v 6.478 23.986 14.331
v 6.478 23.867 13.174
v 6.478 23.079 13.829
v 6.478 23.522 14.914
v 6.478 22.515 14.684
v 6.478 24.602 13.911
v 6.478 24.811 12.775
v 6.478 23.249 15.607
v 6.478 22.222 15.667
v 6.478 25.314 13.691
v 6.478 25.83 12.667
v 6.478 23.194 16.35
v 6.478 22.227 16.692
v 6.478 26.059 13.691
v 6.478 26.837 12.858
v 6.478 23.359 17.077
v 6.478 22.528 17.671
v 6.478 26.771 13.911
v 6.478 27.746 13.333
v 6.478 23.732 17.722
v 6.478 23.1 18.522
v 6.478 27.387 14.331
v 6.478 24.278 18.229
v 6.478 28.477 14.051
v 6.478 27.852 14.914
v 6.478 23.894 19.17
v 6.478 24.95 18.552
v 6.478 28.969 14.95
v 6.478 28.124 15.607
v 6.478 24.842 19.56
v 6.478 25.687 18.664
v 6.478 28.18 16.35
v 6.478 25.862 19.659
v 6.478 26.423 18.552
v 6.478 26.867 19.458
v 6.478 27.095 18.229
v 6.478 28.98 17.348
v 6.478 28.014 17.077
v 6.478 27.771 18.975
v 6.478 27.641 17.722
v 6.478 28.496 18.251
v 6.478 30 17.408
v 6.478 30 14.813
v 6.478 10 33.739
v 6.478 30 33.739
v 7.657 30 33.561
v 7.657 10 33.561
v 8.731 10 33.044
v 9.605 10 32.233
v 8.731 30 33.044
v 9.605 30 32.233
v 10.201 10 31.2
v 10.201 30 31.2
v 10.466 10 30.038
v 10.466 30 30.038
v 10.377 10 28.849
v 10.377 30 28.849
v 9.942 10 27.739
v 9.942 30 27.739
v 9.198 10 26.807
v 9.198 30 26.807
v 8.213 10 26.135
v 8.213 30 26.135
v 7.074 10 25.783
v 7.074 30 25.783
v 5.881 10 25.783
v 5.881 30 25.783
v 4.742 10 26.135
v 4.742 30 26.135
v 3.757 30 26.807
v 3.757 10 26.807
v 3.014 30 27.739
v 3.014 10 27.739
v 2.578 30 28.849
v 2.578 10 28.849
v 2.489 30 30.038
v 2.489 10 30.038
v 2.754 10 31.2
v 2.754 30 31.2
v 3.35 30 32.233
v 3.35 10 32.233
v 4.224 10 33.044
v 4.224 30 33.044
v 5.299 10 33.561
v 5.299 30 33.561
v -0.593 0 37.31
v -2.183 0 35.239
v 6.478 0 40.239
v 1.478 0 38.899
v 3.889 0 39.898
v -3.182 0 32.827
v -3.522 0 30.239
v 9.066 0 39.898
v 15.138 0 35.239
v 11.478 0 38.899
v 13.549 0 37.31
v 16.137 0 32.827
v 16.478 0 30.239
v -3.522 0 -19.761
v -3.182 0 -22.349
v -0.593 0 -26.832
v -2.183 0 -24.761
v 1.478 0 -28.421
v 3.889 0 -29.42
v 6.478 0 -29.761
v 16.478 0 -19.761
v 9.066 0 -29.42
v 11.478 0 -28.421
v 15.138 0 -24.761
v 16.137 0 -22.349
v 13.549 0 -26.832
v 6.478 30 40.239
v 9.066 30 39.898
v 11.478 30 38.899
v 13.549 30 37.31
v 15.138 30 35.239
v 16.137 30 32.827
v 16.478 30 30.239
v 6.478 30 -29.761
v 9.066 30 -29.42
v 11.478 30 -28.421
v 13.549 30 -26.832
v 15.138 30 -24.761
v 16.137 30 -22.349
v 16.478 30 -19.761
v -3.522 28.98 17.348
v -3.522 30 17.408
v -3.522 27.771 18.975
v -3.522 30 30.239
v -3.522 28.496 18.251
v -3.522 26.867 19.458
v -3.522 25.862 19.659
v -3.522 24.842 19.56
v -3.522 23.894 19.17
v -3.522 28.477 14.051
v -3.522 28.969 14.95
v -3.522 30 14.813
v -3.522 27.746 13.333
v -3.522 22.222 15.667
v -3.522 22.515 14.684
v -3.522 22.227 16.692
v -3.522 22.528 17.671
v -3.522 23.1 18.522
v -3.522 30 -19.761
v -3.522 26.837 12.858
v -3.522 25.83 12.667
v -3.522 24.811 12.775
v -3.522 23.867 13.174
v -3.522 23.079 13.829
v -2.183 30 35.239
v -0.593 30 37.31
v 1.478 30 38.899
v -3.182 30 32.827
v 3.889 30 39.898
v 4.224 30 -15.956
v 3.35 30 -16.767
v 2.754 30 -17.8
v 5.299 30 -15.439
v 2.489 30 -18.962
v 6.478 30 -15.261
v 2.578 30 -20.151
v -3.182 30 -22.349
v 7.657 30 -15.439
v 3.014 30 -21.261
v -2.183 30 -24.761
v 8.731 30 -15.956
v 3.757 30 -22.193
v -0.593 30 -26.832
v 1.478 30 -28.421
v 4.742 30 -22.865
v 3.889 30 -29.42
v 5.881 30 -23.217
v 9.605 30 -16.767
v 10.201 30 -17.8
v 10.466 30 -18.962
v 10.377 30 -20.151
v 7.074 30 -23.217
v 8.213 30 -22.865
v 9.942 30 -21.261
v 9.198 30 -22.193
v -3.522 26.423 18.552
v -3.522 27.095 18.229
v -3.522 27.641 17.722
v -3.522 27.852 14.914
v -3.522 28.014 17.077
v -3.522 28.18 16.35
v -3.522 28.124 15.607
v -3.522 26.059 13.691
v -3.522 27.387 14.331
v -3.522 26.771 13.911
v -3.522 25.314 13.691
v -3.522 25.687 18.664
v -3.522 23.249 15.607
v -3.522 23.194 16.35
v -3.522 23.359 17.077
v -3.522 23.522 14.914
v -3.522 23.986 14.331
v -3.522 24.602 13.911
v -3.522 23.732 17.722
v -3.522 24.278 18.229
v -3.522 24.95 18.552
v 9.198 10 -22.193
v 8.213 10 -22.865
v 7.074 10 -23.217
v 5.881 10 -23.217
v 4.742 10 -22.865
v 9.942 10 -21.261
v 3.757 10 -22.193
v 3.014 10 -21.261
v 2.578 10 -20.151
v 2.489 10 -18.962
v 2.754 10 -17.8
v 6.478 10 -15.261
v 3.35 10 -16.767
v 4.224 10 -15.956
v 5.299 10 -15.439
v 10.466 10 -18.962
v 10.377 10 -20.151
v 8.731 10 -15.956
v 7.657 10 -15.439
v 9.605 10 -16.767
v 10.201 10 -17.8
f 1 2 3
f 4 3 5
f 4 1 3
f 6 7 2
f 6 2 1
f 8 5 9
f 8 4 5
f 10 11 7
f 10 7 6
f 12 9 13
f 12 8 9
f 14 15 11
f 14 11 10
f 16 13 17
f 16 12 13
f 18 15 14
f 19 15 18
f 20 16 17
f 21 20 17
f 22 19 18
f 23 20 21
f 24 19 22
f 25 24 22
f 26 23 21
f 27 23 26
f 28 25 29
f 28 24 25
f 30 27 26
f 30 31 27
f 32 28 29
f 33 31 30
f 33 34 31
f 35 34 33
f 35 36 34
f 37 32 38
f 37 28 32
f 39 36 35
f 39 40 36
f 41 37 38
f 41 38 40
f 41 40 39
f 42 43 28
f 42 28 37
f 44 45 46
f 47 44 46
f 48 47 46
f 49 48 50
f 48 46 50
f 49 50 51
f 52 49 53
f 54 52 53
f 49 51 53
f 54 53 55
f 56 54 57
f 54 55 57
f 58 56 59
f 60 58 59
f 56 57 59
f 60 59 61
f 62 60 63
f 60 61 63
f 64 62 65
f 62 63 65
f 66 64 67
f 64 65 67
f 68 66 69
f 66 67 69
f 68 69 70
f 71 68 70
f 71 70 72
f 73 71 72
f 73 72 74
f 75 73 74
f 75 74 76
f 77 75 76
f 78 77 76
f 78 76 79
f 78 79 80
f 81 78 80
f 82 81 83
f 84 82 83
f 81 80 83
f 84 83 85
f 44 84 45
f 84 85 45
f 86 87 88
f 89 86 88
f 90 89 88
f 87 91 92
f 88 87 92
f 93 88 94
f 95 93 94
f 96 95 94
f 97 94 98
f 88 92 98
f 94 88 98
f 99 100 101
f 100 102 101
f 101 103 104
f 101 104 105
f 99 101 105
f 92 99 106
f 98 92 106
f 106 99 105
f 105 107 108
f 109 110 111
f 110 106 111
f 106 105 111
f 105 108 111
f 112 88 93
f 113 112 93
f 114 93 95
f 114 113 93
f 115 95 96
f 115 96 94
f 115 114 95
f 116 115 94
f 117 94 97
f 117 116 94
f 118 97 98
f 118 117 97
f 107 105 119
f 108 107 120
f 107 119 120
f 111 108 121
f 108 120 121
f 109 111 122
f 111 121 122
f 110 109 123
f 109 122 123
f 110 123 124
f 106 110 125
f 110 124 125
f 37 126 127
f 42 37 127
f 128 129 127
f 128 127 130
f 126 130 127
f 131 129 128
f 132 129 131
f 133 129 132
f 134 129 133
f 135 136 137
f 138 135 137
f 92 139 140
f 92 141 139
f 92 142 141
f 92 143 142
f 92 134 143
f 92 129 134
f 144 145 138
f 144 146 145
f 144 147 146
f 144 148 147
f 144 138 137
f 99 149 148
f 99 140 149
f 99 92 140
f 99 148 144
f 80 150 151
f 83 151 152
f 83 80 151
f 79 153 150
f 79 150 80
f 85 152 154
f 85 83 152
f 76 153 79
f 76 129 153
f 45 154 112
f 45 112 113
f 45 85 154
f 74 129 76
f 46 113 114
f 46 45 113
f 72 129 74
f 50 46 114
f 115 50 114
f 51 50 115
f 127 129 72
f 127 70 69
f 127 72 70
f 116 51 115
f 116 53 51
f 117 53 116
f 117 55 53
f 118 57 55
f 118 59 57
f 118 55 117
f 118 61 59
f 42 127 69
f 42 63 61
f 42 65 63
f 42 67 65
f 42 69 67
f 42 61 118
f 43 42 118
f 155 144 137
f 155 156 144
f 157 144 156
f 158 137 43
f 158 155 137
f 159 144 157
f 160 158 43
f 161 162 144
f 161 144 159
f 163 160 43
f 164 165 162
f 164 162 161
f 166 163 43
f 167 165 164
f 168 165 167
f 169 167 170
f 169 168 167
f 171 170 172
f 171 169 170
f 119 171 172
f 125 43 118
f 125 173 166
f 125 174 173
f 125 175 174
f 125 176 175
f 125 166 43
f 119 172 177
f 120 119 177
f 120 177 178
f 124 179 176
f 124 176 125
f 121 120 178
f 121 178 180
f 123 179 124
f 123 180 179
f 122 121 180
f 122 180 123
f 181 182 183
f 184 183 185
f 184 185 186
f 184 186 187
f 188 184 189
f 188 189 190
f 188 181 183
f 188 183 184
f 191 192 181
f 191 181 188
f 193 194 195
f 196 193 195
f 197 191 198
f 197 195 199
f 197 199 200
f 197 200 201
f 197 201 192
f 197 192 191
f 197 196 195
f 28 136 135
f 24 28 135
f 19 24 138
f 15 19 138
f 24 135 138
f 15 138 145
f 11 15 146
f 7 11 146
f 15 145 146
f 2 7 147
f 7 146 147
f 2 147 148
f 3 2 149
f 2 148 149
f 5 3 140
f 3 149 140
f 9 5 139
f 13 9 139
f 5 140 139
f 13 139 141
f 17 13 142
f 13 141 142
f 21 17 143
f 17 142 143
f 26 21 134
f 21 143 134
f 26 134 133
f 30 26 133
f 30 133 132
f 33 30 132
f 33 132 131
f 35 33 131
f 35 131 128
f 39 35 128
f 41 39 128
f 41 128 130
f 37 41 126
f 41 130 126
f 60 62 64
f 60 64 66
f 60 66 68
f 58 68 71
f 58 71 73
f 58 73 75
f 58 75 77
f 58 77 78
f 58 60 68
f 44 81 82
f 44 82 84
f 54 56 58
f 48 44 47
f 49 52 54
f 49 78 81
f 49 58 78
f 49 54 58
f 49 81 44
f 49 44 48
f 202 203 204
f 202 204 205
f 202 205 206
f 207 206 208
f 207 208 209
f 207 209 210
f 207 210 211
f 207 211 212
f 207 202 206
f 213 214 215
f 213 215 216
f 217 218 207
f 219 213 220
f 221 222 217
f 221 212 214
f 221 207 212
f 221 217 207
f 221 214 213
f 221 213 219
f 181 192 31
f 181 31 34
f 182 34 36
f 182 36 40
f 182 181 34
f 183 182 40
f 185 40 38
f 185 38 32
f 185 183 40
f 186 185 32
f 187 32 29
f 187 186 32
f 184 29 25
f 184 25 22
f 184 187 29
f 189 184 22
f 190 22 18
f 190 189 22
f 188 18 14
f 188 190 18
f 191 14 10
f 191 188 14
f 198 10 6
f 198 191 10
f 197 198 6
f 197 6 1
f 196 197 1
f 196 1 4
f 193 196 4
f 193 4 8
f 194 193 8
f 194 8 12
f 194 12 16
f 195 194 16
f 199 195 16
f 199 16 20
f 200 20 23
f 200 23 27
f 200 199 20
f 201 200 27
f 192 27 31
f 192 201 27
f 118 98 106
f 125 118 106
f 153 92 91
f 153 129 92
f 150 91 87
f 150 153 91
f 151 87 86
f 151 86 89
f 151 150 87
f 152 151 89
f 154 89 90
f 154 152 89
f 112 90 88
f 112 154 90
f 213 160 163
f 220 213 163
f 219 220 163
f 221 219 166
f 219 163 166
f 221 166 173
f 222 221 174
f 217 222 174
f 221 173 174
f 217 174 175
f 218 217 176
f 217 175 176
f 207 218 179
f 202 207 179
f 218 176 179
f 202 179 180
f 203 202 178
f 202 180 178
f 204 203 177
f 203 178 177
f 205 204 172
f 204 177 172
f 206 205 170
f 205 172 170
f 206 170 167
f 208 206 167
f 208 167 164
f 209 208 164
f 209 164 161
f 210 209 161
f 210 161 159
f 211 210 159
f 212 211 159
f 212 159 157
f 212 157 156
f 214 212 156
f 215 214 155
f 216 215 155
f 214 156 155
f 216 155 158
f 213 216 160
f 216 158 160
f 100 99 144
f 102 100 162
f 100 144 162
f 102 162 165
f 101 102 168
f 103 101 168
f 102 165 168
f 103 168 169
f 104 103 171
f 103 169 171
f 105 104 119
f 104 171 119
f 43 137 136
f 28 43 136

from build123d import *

# Parameters (mm, degrees)
SKETCH2_W           = 20
SKETCH2_H           = 70
BOSS_EXTRUDE1_DEPTH = 30
SKETCH3_R           = 4
CUT_EXTRUDE1_DEPTH  = 20
SKETCH4_R           = 2.5
CUT_EXTRUDE2_DEPTH  = 10
FILLET1_R           = 10


with BuildPart() as part:
    # Sketch2 → Boss-Extrude1 (new body)
    with BuildSketch(Plane(origin=(0, 0, 0), x_dir=(1, 0, 0), z_dir=(0, 1, 0))):
        with Locations((6.47761194, -5.23880597)):
            Rectangle(SKETCH2_W, SKETCH2_H)
    extrude(amount=BOSS_EXTRUDE1_DEPTH)

    # Sketch3 → Cut-Extrude1 (cut)
    with BuildSketch(Plane(origin=(0, 30, 0), x_dir=(1, 0, 0), z_dir=(0, 1, 0))):
        with Locations(Location((6.47761194, 19.26119403, 0), (0, 0, 270))):
            Circle(SKETCH3_R)
        with Locations(Location((6.47761194, -29.73880597, 0), (0, 0, 270))):
            Circle(SKETCH3_R)
    extrude(amount=-CUT_EXTRUDE1_DEPTH, mode=Mode.SUBTRACT)

    # Sketch4 → Cut-Extrude2 (cut)
    with BuildSketch(Plane.ZY.offset(3.52238806)):
        with BuildLine():
            Line((17.415034126, 30.126407987), (14.795699792, 30.126407987))
            Line((14.795699792, 30.126407987), (14.949961333, 28.969446425))
            ThreePointArc((14.949961333, 28.969446425), (16.17927412, 22.186618473), (17.347611009, 28.980215007))
            Line((17.347611009, 28.980215007), (17.415034126, 30.126407987))
        make_face()
        with Locations((16.163554702, 25.686583173)):
            Circle(SKETCH4_R, mode=Mode.SUBTRACT)
    extrude(amount=-CUT_EXTRUDE2_DEPTH, mode=Mode.SUBTRACT)

    # Fillet1
    fillet1_edges = [part.edges().sort_by_distance(p)[0] for p in [
        (-3.52238806, 15, -29.76119403),
        (16.47761194, 15, -29.76119403),
        (16.47761194, 15, 40.23880597),
        (-3.52238806, 15, 40.23880597),
    ]]
    fillet(fillet1_edges, radius=FILLET1_R - 0.0001)  # a hair under: the kernel refuses the full size


solid = part.part
